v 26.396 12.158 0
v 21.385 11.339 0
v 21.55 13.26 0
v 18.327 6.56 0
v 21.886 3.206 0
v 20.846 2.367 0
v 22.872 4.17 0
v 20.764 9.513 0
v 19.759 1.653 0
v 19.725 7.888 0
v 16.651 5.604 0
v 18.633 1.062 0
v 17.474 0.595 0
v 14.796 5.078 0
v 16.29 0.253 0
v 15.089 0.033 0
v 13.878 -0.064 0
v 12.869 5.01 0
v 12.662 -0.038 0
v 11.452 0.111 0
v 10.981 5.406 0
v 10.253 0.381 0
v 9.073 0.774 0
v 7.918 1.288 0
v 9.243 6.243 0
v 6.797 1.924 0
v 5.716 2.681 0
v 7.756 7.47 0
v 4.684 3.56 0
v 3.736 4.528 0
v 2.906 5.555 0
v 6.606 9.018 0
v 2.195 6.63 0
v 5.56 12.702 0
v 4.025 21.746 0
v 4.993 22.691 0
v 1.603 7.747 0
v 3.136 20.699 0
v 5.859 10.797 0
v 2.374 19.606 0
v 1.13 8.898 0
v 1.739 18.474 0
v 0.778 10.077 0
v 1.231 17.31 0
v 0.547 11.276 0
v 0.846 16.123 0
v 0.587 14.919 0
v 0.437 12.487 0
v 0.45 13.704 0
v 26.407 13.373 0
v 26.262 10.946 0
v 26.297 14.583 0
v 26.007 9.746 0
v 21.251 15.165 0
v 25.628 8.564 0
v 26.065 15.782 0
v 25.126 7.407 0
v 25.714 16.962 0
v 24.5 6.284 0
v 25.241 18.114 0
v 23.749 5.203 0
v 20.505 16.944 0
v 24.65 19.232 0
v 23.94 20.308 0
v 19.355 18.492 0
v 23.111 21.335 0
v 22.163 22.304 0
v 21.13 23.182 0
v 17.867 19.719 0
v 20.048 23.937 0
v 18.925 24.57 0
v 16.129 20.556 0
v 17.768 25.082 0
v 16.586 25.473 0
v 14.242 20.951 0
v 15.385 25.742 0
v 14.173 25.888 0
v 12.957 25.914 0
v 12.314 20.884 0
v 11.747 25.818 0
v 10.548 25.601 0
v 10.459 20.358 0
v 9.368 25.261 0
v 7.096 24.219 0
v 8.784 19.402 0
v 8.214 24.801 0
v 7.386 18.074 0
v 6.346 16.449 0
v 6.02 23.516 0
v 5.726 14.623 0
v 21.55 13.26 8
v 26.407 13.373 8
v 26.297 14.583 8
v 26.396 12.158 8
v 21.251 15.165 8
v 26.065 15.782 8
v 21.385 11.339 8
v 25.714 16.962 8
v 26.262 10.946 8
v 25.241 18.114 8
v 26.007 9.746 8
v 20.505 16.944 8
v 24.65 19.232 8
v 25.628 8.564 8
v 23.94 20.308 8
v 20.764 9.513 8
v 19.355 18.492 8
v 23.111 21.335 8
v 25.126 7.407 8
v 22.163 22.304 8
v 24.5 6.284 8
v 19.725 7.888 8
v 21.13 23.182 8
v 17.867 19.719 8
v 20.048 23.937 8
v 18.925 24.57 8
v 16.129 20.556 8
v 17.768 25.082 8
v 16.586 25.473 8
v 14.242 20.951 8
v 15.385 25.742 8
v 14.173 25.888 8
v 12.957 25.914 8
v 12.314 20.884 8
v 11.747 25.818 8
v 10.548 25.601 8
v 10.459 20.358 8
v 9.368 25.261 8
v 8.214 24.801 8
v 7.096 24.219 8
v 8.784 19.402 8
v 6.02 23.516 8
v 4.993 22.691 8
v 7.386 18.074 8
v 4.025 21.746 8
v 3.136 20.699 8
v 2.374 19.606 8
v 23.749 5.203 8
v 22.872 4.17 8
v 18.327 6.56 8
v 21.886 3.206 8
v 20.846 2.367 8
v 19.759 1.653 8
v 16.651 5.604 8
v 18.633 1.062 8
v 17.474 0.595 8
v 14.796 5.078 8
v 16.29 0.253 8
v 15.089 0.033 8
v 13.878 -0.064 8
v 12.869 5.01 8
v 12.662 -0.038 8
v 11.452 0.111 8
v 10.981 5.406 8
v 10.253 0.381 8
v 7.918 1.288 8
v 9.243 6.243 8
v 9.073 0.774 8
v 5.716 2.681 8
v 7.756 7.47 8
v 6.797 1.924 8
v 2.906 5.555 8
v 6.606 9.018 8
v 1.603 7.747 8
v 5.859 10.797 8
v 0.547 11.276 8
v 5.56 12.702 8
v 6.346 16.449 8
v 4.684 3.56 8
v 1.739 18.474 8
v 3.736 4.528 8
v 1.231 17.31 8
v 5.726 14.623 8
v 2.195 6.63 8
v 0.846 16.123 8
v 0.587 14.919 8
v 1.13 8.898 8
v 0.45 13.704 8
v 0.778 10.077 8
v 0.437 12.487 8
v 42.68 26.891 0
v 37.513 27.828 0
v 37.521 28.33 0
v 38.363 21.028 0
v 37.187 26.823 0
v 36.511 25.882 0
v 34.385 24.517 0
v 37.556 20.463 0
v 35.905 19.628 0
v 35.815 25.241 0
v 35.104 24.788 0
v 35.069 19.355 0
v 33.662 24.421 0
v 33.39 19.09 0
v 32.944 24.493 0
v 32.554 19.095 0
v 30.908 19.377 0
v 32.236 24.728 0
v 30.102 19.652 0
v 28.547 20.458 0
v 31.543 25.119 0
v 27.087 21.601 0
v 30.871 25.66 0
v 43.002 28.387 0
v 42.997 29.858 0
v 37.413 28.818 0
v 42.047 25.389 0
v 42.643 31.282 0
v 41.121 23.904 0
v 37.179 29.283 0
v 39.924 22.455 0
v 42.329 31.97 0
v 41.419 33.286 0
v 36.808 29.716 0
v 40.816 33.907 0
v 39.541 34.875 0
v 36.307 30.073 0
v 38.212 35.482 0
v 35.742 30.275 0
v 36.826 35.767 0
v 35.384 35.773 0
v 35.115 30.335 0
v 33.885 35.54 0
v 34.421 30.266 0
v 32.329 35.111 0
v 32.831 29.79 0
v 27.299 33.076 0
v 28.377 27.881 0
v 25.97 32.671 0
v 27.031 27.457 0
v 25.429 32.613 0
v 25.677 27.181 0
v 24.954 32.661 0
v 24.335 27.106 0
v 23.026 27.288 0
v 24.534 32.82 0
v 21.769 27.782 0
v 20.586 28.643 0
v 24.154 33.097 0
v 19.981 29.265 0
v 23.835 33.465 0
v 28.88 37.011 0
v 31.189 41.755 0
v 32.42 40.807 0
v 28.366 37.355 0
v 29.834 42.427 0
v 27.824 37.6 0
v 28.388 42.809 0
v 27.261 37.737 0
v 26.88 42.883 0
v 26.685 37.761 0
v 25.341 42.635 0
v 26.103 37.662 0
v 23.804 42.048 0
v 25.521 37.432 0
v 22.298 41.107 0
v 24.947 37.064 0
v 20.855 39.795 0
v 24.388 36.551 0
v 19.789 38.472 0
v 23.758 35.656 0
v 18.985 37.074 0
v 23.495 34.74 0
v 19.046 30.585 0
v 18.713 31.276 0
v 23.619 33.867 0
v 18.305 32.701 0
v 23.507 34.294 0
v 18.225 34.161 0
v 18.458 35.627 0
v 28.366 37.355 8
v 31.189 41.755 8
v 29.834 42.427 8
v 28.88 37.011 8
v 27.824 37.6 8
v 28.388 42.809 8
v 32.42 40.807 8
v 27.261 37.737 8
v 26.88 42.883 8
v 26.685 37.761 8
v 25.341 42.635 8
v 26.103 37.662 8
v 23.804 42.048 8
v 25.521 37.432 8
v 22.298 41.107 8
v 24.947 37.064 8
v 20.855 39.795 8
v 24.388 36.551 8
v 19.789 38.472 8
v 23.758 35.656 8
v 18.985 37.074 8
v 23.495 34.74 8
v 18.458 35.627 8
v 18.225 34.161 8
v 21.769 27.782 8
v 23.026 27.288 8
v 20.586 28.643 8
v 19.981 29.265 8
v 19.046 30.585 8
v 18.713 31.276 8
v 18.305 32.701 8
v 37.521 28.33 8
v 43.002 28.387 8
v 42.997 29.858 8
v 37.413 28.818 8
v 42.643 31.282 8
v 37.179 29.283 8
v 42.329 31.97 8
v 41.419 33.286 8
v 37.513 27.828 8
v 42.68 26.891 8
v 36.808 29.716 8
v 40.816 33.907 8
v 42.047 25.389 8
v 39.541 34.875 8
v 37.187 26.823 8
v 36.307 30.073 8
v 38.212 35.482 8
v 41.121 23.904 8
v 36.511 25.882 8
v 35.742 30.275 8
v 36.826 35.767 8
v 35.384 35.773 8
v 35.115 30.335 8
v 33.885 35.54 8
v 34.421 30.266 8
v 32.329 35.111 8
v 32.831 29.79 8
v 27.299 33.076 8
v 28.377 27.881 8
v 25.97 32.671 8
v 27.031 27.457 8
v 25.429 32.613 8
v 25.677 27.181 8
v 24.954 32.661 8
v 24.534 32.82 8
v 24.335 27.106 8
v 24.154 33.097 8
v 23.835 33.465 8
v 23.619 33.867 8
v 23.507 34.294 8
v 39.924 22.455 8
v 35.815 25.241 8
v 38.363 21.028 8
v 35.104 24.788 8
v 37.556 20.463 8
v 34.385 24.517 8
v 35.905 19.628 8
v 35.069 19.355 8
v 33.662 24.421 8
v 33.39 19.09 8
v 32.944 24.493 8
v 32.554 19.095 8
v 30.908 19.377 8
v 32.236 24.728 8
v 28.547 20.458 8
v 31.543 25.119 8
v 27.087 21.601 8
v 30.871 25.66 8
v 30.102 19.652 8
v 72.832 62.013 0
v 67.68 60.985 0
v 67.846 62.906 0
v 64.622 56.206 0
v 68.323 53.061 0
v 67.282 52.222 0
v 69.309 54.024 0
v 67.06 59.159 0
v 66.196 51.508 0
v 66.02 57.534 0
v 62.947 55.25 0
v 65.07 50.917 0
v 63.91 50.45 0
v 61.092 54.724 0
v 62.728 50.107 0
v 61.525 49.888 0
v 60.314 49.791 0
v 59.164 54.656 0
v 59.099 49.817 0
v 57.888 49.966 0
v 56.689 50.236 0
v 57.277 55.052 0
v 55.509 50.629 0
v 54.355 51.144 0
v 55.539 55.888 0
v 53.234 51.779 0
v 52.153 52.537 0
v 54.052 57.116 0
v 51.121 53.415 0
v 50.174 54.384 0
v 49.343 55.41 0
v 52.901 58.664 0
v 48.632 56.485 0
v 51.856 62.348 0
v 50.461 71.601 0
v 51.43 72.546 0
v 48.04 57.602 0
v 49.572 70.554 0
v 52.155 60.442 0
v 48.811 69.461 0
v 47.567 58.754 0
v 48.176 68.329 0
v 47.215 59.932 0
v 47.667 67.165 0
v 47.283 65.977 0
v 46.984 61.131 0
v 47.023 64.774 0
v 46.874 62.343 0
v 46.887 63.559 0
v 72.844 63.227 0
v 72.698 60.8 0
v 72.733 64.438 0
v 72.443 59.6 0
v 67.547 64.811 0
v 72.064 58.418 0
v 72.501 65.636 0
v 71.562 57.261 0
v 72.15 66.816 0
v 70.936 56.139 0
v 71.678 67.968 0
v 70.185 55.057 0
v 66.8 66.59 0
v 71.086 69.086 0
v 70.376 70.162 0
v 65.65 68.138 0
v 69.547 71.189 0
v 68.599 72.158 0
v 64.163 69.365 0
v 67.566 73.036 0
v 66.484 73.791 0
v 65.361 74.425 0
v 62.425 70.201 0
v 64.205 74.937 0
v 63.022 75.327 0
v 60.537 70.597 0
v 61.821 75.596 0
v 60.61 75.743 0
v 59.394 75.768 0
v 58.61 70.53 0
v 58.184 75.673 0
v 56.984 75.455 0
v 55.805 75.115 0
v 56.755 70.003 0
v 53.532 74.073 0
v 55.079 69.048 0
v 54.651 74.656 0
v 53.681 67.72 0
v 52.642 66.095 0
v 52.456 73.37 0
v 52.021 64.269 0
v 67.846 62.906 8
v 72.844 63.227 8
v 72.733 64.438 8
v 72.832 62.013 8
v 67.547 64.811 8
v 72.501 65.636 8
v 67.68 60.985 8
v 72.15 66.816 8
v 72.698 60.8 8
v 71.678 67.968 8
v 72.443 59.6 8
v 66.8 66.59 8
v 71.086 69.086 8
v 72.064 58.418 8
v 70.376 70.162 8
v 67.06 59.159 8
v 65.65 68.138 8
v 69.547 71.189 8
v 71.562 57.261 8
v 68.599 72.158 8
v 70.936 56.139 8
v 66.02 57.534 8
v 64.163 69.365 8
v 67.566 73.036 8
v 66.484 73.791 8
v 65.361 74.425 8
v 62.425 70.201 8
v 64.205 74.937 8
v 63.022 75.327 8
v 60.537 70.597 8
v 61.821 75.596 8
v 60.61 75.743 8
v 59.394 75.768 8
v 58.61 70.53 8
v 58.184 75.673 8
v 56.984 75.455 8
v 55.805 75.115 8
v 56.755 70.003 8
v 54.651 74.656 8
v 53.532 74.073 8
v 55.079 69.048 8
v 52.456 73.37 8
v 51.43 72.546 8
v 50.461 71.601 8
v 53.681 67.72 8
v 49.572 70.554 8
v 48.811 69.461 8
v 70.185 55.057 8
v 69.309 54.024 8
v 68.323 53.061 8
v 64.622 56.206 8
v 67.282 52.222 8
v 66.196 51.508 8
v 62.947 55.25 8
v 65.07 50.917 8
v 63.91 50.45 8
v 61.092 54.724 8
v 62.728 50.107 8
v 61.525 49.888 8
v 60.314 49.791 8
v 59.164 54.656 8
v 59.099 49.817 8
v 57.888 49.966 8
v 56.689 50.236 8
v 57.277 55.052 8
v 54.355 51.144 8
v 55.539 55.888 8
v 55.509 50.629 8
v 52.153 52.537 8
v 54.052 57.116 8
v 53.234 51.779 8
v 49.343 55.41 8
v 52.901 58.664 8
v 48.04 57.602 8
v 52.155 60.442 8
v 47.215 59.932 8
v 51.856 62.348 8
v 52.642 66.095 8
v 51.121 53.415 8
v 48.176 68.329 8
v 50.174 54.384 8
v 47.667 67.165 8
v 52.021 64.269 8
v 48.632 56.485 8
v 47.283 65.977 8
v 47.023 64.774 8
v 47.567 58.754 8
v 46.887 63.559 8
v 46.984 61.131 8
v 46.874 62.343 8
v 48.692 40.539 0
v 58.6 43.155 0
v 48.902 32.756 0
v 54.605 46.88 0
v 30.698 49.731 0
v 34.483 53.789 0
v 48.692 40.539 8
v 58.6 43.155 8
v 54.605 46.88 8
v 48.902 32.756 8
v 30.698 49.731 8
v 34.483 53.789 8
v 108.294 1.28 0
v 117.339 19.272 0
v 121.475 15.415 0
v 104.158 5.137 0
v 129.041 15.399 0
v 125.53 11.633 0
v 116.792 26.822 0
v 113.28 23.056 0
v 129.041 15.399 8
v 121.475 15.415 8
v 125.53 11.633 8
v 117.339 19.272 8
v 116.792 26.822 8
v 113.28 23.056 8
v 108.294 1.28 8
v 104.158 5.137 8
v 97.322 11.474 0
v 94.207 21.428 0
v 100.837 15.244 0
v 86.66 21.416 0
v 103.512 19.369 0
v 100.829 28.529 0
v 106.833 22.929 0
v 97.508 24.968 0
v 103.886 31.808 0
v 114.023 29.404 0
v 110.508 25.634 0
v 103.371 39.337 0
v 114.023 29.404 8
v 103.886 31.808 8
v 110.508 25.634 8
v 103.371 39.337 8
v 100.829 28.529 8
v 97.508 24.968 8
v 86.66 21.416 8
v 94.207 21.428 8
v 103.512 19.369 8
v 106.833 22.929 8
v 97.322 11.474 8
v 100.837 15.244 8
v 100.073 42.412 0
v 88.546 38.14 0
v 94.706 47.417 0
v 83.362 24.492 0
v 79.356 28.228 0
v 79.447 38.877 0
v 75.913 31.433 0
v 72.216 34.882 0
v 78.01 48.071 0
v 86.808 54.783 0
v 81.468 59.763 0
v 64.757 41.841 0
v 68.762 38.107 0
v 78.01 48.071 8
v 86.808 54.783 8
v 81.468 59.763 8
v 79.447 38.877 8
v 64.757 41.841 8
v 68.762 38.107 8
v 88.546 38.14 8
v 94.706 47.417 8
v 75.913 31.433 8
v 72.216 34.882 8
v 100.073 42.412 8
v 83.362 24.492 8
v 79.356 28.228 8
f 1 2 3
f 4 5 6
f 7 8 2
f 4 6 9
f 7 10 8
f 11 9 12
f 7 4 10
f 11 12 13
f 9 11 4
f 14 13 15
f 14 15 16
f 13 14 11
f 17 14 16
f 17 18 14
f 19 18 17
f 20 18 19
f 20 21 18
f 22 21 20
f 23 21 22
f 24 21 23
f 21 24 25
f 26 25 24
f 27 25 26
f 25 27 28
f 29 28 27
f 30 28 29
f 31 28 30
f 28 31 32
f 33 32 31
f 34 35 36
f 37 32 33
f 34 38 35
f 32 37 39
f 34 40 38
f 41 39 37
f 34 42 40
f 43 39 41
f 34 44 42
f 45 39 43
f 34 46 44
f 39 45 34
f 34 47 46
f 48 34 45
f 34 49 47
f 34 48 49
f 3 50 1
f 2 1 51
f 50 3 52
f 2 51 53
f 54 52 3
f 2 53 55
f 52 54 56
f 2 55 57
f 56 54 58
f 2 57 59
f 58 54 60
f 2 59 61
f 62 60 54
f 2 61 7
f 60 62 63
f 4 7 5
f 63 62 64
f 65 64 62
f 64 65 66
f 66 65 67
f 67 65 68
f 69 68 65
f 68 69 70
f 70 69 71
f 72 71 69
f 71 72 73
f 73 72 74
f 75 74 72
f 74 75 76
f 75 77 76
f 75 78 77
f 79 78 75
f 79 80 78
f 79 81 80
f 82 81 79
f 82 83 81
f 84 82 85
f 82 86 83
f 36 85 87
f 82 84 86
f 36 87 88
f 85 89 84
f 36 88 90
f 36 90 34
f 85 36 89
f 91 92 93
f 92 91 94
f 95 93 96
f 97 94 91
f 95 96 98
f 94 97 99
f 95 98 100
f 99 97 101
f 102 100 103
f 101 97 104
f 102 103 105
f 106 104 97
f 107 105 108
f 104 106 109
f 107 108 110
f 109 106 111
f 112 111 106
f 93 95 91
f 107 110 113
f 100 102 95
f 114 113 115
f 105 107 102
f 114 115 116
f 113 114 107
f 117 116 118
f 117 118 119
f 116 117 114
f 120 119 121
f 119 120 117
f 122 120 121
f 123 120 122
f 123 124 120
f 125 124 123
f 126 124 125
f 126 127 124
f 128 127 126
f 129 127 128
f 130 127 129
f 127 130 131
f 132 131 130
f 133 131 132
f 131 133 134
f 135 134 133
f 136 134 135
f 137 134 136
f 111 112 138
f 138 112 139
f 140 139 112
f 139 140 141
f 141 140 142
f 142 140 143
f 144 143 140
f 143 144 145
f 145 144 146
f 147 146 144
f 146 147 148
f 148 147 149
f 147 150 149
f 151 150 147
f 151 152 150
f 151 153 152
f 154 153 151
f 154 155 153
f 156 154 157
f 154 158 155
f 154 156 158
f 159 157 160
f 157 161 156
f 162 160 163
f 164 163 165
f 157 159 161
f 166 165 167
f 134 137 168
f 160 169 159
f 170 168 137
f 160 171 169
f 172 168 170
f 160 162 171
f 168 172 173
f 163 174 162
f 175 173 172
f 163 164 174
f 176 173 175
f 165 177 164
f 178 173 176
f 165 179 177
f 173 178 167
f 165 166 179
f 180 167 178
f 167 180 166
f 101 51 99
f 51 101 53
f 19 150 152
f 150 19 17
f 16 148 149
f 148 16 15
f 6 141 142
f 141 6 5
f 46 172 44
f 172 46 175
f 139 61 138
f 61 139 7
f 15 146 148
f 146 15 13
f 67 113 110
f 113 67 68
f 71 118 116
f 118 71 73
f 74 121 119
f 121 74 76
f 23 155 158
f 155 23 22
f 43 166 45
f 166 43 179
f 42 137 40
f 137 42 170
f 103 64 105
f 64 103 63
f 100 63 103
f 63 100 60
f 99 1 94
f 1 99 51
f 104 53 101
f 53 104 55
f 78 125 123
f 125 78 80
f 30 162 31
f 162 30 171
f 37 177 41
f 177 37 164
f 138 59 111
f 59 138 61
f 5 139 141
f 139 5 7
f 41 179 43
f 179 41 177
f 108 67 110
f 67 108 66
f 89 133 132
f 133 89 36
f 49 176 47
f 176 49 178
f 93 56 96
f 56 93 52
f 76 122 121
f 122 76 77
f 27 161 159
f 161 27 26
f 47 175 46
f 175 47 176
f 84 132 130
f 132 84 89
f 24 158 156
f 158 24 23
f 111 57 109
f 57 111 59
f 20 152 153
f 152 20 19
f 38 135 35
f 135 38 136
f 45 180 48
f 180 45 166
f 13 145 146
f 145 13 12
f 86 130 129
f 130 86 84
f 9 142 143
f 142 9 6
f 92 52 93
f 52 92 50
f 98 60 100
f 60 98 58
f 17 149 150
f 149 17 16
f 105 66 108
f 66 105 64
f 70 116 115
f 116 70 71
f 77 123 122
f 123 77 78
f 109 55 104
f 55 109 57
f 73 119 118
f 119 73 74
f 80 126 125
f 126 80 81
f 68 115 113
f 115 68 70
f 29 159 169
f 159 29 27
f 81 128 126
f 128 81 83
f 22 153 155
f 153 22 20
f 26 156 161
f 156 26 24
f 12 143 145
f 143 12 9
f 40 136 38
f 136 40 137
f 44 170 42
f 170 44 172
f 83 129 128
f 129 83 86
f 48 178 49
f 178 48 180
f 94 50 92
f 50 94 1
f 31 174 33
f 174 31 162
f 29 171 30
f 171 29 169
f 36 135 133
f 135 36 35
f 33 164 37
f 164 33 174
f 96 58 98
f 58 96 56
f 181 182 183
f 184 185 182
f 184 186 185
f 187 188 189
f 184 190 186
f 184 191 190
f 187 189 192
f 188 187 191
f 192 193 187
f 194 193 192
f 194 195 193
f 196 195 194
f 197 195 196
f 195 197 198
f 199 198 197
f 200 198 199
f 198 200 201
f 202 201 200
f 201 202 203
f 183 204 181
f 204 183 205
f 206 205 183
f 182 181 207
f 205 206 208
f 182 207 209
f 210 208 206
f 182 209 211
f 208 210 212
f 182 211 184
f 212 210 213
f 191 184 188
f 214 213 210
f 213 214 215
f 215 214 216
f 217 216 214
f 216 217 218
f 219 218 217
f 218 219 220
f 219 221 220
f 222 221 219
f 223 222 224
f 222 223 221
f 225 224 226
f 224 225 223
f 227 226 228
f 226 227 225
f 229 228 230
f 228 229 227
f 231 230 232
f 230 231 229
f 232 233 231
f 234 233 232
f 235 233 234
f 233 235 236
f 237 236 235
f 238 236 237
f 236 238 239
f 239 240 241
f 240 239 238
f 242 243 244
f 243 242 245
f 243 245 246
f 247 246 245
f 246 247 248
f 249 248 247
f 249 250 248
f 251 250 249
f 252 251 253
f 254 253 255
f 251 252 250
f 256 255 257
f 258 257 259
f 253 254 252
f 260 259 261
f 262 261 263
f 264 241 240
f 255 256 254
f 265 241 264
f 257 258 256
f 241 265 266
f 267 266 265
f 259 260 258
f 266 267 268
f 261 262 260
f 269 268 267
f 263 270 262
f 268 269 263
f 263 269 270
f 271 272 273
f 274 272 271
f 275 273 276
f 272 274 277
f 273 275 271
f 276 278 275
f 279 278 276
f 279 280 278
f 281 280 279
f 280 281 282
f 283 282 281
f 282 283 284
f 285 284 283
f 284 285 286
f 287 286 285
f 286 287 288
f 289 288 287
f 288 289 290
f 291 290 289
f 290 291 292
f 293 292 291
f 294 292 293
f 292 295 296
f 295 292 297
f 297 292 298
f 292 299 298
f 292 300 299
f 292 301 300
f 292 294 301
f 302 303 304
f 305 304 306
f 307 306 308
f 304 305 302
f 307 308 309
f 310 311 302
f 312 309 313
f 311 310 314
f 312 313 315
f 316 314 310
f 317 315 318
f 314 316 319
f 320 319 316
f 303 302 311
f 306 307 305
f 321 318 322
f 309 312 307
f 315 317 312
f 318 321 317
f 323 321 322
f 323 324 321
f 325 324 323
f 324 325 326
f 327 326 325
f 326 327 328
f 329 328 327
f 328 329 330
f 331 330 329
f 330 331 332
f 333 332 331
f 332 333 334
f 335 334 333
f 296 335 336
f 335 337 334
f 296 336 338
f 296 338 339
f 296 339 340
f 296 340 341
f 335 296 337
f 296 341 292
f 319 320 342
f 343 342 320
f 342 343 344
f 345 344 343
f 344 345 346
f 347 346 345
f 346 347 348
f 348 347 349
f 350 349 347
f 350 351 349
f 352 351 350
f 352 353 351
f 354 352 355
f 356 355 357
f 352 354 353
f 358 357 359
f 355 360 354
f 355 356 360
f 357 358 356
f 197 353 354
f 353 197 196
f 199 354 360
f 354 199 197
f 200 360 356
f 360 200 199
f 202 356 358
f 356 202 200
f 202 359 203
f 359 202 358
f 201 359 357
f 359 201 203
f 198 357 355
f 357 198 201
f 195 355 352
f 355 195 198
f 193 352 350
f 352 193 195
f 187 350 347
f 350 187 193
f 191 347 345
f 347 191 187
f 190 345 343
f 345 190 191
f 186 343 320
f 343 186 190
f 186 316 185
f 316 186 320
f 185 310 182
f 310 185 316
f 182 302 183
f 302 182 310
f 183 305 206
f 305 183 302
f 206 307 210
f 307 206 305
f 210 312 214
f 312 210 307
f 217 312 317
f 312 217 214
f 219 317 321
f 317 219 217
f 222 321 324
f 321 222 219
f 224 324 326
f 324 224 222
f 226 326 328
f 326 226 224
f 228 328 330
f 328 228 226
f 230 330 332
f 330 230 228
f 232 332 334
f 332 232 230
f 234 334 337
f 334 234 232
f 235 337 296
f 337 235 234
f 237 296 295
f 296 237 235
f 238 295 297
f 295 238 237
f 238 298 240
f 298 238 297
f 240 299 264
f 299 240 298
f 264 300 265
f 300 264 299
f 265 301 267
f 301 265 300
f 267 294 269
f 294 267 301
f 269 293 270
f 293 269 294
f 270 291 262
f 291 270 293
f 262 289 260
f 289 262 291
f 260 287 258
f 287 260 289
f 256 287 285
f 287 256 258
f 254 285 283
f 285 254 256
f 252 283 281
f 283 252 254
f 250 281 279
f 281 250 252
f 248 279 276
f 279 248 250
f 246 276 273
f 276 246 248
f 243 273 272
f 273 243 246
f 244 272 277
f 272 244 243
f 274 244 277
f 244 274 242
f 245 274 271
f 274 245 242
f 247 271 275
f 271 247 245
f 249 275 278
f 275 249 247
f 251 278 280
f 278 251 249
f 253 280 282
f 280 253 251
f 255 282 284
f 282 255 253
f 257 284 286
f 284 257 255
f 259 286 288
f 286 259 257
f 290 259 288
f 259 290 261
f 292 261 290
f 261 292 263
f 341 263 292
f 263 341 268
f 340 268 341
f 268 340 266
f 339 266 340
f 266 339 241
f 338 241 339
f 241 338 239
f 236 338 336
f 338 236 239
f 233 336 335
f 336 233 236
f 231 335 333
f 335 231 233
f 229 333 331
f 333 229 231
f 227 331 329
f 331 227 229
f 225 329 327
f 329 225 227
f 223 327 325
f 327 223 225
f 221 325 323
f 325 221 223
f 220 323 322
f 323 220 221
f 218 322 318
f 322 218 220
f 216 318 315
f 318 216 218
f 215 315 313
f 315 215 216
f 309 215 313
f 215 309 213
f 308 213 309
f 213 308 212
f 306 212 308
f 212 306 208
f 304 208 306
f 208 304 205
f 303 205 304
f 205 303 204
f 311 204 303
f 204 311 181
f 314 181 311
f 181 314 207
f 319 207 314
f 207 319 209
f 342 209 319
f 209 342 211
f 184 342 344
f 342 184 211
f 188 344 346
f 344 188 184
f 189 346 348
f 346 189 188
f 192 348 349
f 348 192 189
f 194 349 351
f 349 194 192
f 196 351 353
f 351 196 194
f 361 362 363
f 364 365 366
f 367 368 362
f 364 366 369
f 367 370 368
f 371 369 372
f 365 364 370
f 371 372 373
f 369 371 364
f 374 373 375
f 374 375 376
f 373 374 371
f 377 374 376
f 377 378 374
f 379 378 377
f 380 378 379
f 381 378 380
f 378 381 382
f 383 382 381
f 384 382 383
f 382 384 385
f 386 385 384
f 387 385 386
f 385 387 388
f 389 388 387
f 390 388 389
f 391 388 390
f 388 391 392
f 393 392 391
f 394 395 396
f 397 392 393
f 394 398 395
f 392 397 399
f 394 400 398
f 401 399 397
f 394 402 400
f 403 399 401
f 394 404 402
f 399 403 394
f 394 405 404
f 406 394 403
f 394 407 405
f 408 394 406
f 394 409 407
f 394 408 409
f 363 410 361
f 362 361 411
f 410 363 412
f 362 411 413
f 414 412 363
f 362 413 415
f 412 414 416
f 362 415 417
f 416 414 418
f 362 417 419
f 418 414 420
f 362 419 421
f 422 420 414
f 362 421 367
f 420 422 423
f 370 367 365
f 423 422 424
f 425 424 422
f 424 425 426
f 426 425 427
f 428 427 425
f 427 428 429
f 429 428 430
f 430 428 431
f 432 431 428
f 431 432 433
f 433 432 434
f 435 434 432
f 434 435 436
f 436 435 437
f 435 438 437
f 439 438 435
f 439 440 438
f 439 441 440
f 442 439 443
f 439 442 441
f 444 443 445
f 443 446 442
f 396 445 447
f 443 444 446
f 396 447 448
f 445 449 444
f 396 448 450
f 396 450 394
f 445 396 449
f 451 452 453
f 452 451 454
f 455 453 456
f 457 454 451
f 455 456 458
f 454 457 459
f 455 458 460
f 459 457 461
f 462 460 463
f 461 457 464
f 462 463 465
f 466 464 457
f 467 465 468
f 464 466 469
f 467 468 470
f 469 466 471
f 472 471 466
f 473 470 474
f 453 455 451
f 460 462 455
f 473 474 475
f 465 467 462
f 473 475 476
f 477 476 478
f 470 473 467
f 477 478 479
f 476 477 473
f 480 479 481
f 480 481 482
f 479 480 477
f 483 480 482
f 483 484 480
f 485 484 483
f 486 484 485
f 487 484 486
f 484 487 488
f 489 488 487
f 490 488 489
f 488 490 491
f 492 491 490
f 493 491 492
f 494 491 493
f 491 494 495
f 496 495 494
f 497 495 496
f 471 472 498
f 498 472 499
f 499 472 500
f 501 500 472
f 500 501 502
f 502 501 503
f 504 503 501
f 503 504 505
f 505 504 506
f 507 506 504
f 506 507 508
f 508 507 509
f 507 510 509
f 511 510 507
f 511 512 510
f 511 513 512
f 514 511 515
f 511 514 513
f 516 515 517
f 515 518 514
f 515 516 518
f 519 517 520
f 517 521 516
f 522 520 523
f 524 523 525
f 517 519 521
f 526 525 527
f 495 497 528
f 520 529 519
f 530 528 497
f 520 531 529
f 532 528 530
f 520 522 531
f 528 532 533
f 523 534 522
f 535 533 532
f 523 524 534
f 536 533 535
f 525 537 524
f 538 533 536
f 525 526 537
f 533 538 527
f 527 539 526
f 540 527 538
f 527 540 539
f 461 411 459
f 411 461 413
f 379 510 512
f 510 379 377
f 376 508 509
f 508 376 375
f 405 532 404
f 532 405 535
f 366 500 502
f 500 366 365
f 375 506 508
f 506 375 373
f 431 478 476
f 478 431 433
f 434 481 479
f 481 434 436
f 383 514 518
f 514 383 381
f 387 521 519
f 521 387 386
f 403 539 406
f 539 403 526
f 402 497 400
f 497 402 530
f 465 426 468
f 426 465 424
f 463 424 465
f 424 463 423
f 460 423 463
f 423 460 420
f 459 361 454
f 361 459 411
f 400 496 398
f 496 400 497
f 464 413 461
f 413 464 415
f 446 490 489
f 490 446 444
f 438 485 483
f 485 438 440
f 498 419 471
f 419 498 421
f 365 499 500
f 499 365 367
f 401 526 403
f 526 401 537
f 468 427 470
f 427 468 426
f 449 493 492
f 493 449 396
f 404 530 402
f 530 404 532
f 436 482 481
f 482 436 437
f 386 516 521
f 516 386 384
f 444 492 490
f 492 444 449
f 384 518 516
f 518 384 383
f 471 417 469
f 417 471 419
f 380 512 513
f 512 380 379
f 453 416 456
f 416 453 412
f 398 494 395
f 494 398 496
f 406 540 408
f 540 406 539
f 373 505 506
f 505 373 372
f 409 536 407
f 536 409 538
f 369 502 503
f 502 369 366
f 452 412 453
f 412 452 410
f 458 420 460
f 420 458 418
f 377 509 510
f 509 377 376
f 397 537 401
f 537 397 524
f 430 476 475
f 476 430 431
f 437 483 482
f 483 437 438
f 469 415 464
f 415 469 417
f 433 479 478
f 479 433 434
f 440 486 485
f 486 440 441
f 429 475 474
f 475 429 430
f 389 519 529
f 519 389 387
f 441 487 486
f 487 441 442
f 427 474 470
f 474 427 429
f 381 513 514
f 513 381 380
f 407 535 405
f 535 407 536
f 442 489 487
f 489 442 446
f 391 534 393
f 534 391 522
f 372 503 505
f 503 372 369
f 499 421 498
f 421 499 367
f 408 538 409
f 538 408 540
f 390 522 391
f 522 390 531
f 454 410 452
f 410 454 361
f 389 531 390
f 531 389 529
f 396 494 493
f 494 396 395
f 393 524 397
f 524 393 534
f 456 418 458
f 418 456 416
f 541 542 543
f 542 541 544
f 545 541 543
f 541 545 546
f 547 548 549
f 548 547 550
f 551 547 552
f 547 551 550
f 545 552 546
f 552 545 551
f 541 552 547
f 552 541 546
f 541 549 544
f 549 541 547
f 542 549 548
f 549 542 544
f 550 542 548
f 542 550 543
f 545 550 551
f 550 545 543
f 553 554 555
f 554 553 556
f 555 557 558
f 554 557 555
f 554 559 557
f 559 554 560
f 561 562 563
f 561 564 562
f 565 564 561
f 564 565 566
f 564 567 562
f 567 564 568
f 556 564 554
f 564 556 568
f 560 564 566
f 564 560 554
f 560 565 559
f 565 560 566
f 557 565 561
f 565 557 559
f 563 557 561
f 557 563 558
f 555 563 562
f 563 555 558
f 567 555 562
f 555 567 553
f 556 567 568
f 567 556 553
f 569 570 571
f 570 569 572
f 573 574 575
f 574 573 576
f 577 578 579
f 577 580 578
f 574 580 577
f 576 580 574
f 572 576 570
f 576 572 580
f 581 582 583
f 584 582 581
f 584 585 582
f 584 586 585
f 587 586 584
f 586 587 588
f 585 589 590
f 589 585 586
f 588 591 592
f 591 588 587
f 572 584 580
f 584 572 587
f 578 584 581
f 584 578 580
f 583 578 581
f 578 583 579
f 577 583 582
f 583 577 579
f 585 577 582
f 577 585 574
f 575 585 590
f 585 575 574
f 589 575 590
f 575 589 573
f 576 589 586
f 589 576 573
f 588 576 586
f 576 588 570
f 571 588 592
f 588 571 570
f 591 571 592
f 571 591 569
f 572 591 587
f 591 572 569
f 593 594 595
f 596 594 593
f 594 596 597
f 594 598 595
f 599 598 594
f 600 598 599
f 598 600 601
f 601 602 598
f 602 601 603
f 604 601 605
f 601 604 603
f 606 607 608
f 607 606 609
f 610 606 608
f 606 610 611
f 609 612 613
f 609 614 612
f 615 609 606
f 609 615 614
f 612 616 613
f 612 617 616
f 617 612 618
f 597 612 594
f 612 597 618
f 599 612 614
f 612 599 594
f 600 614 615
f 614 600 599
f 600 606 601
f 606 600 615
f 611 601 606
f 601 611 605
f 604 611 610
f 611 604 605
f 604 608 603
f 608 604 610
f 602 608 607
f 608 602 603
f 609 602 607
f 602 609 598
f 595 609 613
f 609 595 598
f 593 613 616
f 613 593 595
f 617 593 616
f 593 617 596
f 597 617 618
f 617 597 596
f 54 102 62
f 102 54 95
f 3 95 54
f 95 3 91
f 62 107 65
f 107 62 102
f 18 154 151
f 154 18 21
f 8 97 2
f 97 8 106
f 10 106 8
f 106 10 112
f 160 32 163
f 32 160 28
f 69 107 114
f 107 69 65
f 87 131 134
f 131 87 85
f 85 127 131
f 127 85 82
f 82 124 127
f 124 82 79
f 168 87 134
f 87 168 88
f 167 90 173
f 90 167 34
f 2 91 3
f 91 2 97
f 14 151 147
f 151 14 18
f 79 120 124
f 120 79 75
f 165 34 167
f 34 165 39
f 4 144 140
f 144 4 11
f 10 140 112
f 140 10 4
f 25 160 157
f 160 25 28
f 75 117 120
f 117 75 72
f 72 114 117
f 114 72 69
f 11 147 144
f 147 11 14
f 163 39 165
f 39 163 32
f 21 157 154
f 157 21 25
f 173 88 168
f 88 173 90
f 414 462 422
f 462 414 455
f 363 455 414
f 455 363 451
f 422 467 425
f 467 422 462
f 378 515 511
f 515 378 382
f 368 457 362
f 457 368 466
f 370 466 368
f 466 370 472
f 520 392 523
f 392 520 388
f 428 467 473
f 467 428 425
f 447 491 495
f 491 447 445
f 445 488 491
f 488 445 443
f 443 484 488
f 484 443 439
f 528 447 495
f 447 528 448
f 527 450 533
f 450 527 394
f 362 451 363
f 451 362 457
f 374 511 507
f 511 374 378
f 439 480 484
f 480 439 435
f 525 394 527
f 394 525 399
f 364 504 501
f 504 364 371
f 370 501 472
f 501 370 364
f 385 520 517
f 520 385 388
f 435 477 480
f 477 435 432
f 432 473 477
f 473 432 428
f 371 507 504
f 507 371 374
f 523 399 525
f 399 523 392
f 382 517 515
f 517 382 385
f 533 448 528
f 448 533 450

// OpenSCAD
// OpenSCAD file automatically generated by svg2cookiercutter.py
// parameters tunable by user
wallHeight = 12;
minWallThickness = 2;
maxWallThickness = 3;
minInsideWallThickness = 1;
maxInsideWallThickness = 3;

wallFlareWidth = 5;
wallFlareThickness = 3;
insideWallFlareWidth = 5;
insideWallFlareThickness = 3;

featureHeight = 8;
minFeatureThickness = 1;
maxFeatureThickness = 3;

connectorThickness = 1.75;
cuttingTaperHeight = 2.5;
cuttingEdgeThickness = 1.25;
// set to non-zero value to generate a demoulding plate
demouldingPlateHeight = 0;
demouldingPlateSlack = 1.5;

// sizing
function clamp(t,minimum,maximum) = min(maximum,max(t,minimum));
function featureThickness(t)      = clamp(t,minFeatureThickness,maxFeatureThickness);
function wallThickness(t)         = clamp(t,minWallThickness,maxWallThickness);
function insideWallThickness(t)   = clamp(t,minInsideWallThickness,maxInsideWallThickness);

size = 128.628;
scale = size/128.628;

// helper modules: subshapes
module ribbon(points, thickness=1) {
    union() {
        for (i=[1:len(points)-1]) {
            hull() {
                translate(points[i-1]) circle(d=thickness, $fn=8);
                translate(points[i]) circle(d=thickness, $fn=8);
            }
        }
    }
}


module wall(points,height,thickness) {
    module profile() {
        if (height>=cuttingTaperHeight && cuttingTaperHeight>0 && cuttingEdgeThickness<thickness) {
            cylinder(h=height-cuttingTaperHeight+0.001,d=thickness,$fn=8);
            translate([0,0,height-cuttingTaperHeight]) cylinder(h=cuttingTaperHeight,d1=thickness,d2=cuttingEdgeThickness);
        }
        else {
            cylinder(h=height,d=thickness,$fn=8);
        }
    }
    for (i=[1:len(points)-1]) {
        hull() {
            translate(points[i-1]) profile();
            translate(points[i])   profile();
        }
    }
}


module outerFlare(path) {
  difference() {
    render(convexity=10) linear_extrude(height=wallFlareThickness) ribbon(path,thickness=wallFlareWidth);
    translate([0,0,-0.01]) linear_extrude(height=wallFlareThickness+0.02) polygon(points=path);
  }
}

module innerFlare(path) {
  intersection() {
    render(convexity=10) linear_extrude(height=insideWallFlareThickness) ribbon(path,thickness=insideWallFlareWidth);
    translate([0,0,-0.01]) linear_extrude(height=insideWallFlareThickness+0.02) polygon(points=path);
  }
}

module fill(path,height) {
  render(convexity=10) linear_extrude(height=height) polygon(points=path);
}


// data from svg file
feature_0 = scale * [[-41.231,215.240],[-40.045,216.234],[-38.770,216.958],[-37.440,217.413],[-36.089,217.597],[-34.751,217.512],[-33.460,217.158],[-32.251,216.536],[-31.157,215.645],[-30.235,214.519],[-29.593,213.291],[-29.229,211.990],[-29.142,210.649],[-29.328,209.300],[-29.787,207.975],[-30.515,206.705],[-31.511,205.521],[-32.695,204.525],[-33.966,203.796],[-35.291,203.337],[-36.640,203.151],[-37.981,203.238],[-39.281,203.602],[-40.510,204.244],[-41.636,205.166],[-42.534,206.267],[-43.160,207.480],[-43.514,208.771],[-43.597,210.108],[-43.410,211.456],[-42.953,212.783],[-42.226,214.055],[-41.231,215.240]];

feature_1 = scale * [[-27.309,201.319],[-26.396,202.320],[-25.602,203.375],[-24.929,204.474],[-24.376,205.611],[-23.944,206.778],[-23.633,207.969],[-23.444,209.175],[-23.377,210.389],[-23.432,211.605],[-23.611,212.814],[-23.912,214.009],[-24.338,215.182],[-24.887,216.327],[-25.561,217.436],[-26.360,218.502],[-27.285,219.517],[-28.286,220.428],[-29.341,221.217],[-30.441,221.882],[-31.579,222.424],[-32.748,222.844],[-33.939,223.142],[-35.145,223.317],[-36.358,223.371],[-37.572,223.303],[-38.778,223.114],[-39.969,222.804],[-41.137,222.372],[-42.275,221.820],[-43.375,221.148],[-44.430,220.355],[-45.432,219.442],[-46.345,218.440],[-47.138,217.385],[-47.810,216.285],[-48.362,215.147],[-48.794,213.979],[-49.104,212.788],[-49.294,211.581],[-49.362,210.368],[-49.308,209.154],[-49.132,207.948],[-48.835,206.757],[-48.415,205.589],[-47.873,204.451],[-47.208,203.350],[-46.420,202.296],[-45.508,201.294],[-44.489,200.365],[-43.420,199.563],[-42.309,198.887],[-41.163,198.336],[-39.988,197.910],[-38.793,197.609],[-37.585,197.431],[-36.371,197.377],[-35.157,197.445],[-33.953,197.636],[-32.764,197.948],[-31.598,198.382],[-30.462,198.936],[-29.364,199.611],[-28.310,200.405],[-27.309,201.319]];

feature_2 = scale * [[-63.187,218.973],[-61.577,217.601],[-60.751,217.065],[-59.072,216.288],[-58.227,216.044],[-56.540,215.838],[-55.705,215.872],[-54.069,216.212],[-53.274,216.514],[-51.748,217.374],[-50.328,218.568],[-54.252,222.492],[-54.904,221.928],[-55.583,221.513],[-56.283,221.253],[-56.998,221.156],[-57.724,221.227],[-58.452,221.473],[-59.178,221.901],[-59.896,222.517],[-60.604,223.434],[-60.965,224.427],[-60.991,224.928],[-60.900,225.420],[-60.682,225.893],[-60.327,226.338],[-59.838,226.713],[-59.281,226.934],[-58.656,227.016],[-57.960,226.971],[-56.355,226.551],[-51.837,224.799],[-50.477,224.422],[-49.114,224.193],[-47.770,224.165],[-46.468,224.393],[-45.229,224.930],[-44.077,225.832],[-43.494,226.475],[-42.606,227.827],[-42.297,228.529],[-41.939,229.967],[-41.910,231.429],[-42.194,232.886],[-42.771,234.314],[-43.624,235.683],[-44.735,236.968],[-46.223,238.229],[-47.761,239.117],[-49.318,239.650],[-50.864,239.844],[-52.369,239.717],[-53.801,239.285],[-55.131,238.566],[-56.328,237.576],[-52.658,233.906],[-52.156,234.267],[-51.623,234.531],[-51.065,234.688],[-50.491,234.732],[-49.905,234.653],[-49.316,234.444],[-48.729,234.096],[-48.153,233.603],[-47.492,232.730],[-47.197,231.824],[-47.194,231.378],[-47.291,230.947],[-47.492,230.538],[-47.798,230.159],[-48.168,229.869],[-48.583,229.695],[-49.056,229.631],[-49.598,229.670],[-50.941,230.028],[-56.039,231.886],[-57.609,232.261],[-59.115,232.441],[-60.556,232.385],[-61.931,232.052],[-63.238,231.399],[-64.478,230.387],[-65.059,229.745],[-65.923,228.398],[-66.213,227.700],[-66.517,226.264],[-66.471,224.794],[-66.096,223.310],[-65.411,221.831],[-64.434,220.379],[-63.187,218.973]];

feature_3 = scale * [[-89.379,263.444],[-88.193,264.438],[-86.918,265.162],[-85.588,265.616],[-84.237,265.800],[-82.899,265.716],[-81.609,265.362],[-80.399,264.739],[-79.305,263.848],[-78.383,262.723],[-77.741,261.494],[-77.377,260.193],[-77.289,258.853],[-77.476,257.504],[-77.934,256.178],[-78.663,254.908],[-79.659,253.725],[-80.843,252.728],[-82.113,251.999],[-83.439,251.541],[-84.788,251.354],[-86.129,251.442],[-87.429,251.805],[-88.658,252.447],[-89.784,253.369],[-90.682,254.471],[-91.308,255.684],[-91.662,256.975],[-91.745,258.311],[-91.558,259.659],[-91.101,260.986],[-90.374,262.259],[-89.379,263.444]];

feature_4 = scale * [[-75.458,249.523],[-74.545,250.525],[-73.751,251.579],[-73.078,252.678],[-72.525,253.815],[-72.093,254.983],[-71.782,256.173],[-71.593,257.379],[-71.525,258.594],[-71.581,259.809],[-71.759,261.018],[-72.061,262.212],[-72.486,263.386],[-73.035,264.531],[-73.709,265.640],[-74.508,266.706],[-75.433,267.721],[-76.434,268.632],[-77.489,269.420],[-78.589,270.085],[-79.727,270.628],[-80.896,271.047],[-82.087,271.345],[-83.293,271.521],[-84.506,271.574],[-85.720,271.507],[-86.926,271.317],[-88.117,271.007],[-89.285,270.576],[-90.423,270.024],[-91.523,269.351],[-92.578,268.558],[-93.580,267.645],[-94.493,266.643],[-95.286,265.588],[-95.958,264.488],[-96.510,263.350],[-96.942,262.182],[-97.252,260.991],[-97.442,259.785],[-97.510,258.571],[-97.456,257.358],[-97.280,256.151],[-96.983,254.960],[-96.563,253.792],[-96.021,252.654],[-95.356,251.554],[-94.568,250.499],[-93.656,249.497],[-92.637,248.569],[-91.568,247.767],[-90.457,247.091],[-89.311,246.540],[-88.136,246.114],[-86.942,245.812],[-85.733,245.635],[-84.519,245.581],[-83.306,245.649],[-82.101,245.840],[-80.912,246.152],[-79.746,246.586],[-78.611,247.141],[-77.513,247.815],[-76.459,248.610],[-75.458,249.523]];

feature_5 = scale * [[-78.712,242.871],[-82.574,239.009],[-72.519,228.954],[-54.919,246.554],[-58.843,250.478],[-72.581,236.740],[-78.712,242.871]];

feature_6 = scale * [[-148.364,205.170],[-144.443,209.091],[-130.777,195.425],[-126.778,199.424],[-140.444,213.090],[-136.520,217.014],[-140.161,220.655],[-152.004,208.811],[-148.364,205.170]];

feature_7 = scale * [[-123.812,209.641],[-120.167,205.996],[-109.859,216.304],[-127.185,233.630],[-137.484,223.332],[-133.839,219.687],[-127.437,226.088],[-124.267,222.918],[-130.072,217.112],[-126.629,213.670],[-120.824,219.475],[-117.401,216.052],[-123.812,209.641]];

feature_8 = scale * [[-106.670,219.493],[-102.797,223.366],[-112.327,232.952],[-99.468,226.690],[-95.893,230.265],[-102.144,243.244],[-92.554,233.609],[-88.682,237.481],[-106.008,254.808],[-111.171,249.645],[-103.259,234.006],[-118.807,242.008],[-123.996,236.819],[-106.670,219.493]];

// main modules
module cookieCutter() {
    fill(feature_0,featureHeight);
    fill(feature_1,featureHeight);
    fill(feature_2,featureHeight);
    fill(feature_3,featureHeight);
    fill(feature_4,featureHeight);
    fill(feature_5,featureHeight);
    fill(feature_6,featureHeight);
    fill(feature_7,featureHeight);
    fill(feature_8,featureHeight);
}

module demouldingPlate(){
  // a plate to help push on the cookie to turn it out
  render(convexity=10) difference() {
    linear_extrude(height=demouldingPlateHeight) union() {
    }
    translate([0,0,-0.01]) linear_extrude(height=demouldingPlateHeight+0.02) union() {
      ribbon(feature_0,thickness=demouldingPlateSlack);
      ribbon(feature_1,thickness=demouldingPlateSlack);
      ribbon(feature_2,thickness=demouldingPlateSlack);
      ribbon(feature_3,thickness=demouldingPlateSlack);
      ribbon(feature_4,thickness=demouldingPlateSlack);
      ribbon(feature_5,thickness=demouldingPlateSlack);
      ribbon(feature_6,thickness=demouldingPlateSlack);
      ribbon(feature_7,thickness=demouldingPlateSlack);
      ribbon(feature_8,thickness=demouldingPlateSlack);
      polygon(points=feature_0);
      polygon(points=feature_1);
      polygon(points=feature_2);
      polygon(points=feature_3);
      polygon(points=feature_4);
      polygon(points=feature_5);
      polygon(points=feature_6);
      polygon(points=feature_7);
      polygon(points=feature_8);
    }
  }
}

module finalcall() { ////////////////////////////////////////////////////////////////////////////////
    // final call, use main modules
    translate([152.004*scale + wallFlareWidth/2,  -195.425*scale + wallFlareWidth/2,0])
      cookieCutter();

    // translate([-40,15,0]) cylinder(h=wallHeight+10,d=5,$fn=20); // handle
    if (demouldingPlateHeight>0)
      mirror([1,0,0])
        translate([152.004*scale + wallFlareWidth/2,  -195.425*scale + wallFlareWidth/2,0])
          demouldingPlate();
}

module oslomet() {
    rotate([0,0,2]) translate([132,-5,0]) {
        difference() {
            mirror([1,0,0]) finalcall();
            translate([-118,17.5,0])
                cylinder(h=10,d=16);
            translate([-70,65.5,0])
                cylinder(h=10,d=16);
        }
    }
}

oslomet();
